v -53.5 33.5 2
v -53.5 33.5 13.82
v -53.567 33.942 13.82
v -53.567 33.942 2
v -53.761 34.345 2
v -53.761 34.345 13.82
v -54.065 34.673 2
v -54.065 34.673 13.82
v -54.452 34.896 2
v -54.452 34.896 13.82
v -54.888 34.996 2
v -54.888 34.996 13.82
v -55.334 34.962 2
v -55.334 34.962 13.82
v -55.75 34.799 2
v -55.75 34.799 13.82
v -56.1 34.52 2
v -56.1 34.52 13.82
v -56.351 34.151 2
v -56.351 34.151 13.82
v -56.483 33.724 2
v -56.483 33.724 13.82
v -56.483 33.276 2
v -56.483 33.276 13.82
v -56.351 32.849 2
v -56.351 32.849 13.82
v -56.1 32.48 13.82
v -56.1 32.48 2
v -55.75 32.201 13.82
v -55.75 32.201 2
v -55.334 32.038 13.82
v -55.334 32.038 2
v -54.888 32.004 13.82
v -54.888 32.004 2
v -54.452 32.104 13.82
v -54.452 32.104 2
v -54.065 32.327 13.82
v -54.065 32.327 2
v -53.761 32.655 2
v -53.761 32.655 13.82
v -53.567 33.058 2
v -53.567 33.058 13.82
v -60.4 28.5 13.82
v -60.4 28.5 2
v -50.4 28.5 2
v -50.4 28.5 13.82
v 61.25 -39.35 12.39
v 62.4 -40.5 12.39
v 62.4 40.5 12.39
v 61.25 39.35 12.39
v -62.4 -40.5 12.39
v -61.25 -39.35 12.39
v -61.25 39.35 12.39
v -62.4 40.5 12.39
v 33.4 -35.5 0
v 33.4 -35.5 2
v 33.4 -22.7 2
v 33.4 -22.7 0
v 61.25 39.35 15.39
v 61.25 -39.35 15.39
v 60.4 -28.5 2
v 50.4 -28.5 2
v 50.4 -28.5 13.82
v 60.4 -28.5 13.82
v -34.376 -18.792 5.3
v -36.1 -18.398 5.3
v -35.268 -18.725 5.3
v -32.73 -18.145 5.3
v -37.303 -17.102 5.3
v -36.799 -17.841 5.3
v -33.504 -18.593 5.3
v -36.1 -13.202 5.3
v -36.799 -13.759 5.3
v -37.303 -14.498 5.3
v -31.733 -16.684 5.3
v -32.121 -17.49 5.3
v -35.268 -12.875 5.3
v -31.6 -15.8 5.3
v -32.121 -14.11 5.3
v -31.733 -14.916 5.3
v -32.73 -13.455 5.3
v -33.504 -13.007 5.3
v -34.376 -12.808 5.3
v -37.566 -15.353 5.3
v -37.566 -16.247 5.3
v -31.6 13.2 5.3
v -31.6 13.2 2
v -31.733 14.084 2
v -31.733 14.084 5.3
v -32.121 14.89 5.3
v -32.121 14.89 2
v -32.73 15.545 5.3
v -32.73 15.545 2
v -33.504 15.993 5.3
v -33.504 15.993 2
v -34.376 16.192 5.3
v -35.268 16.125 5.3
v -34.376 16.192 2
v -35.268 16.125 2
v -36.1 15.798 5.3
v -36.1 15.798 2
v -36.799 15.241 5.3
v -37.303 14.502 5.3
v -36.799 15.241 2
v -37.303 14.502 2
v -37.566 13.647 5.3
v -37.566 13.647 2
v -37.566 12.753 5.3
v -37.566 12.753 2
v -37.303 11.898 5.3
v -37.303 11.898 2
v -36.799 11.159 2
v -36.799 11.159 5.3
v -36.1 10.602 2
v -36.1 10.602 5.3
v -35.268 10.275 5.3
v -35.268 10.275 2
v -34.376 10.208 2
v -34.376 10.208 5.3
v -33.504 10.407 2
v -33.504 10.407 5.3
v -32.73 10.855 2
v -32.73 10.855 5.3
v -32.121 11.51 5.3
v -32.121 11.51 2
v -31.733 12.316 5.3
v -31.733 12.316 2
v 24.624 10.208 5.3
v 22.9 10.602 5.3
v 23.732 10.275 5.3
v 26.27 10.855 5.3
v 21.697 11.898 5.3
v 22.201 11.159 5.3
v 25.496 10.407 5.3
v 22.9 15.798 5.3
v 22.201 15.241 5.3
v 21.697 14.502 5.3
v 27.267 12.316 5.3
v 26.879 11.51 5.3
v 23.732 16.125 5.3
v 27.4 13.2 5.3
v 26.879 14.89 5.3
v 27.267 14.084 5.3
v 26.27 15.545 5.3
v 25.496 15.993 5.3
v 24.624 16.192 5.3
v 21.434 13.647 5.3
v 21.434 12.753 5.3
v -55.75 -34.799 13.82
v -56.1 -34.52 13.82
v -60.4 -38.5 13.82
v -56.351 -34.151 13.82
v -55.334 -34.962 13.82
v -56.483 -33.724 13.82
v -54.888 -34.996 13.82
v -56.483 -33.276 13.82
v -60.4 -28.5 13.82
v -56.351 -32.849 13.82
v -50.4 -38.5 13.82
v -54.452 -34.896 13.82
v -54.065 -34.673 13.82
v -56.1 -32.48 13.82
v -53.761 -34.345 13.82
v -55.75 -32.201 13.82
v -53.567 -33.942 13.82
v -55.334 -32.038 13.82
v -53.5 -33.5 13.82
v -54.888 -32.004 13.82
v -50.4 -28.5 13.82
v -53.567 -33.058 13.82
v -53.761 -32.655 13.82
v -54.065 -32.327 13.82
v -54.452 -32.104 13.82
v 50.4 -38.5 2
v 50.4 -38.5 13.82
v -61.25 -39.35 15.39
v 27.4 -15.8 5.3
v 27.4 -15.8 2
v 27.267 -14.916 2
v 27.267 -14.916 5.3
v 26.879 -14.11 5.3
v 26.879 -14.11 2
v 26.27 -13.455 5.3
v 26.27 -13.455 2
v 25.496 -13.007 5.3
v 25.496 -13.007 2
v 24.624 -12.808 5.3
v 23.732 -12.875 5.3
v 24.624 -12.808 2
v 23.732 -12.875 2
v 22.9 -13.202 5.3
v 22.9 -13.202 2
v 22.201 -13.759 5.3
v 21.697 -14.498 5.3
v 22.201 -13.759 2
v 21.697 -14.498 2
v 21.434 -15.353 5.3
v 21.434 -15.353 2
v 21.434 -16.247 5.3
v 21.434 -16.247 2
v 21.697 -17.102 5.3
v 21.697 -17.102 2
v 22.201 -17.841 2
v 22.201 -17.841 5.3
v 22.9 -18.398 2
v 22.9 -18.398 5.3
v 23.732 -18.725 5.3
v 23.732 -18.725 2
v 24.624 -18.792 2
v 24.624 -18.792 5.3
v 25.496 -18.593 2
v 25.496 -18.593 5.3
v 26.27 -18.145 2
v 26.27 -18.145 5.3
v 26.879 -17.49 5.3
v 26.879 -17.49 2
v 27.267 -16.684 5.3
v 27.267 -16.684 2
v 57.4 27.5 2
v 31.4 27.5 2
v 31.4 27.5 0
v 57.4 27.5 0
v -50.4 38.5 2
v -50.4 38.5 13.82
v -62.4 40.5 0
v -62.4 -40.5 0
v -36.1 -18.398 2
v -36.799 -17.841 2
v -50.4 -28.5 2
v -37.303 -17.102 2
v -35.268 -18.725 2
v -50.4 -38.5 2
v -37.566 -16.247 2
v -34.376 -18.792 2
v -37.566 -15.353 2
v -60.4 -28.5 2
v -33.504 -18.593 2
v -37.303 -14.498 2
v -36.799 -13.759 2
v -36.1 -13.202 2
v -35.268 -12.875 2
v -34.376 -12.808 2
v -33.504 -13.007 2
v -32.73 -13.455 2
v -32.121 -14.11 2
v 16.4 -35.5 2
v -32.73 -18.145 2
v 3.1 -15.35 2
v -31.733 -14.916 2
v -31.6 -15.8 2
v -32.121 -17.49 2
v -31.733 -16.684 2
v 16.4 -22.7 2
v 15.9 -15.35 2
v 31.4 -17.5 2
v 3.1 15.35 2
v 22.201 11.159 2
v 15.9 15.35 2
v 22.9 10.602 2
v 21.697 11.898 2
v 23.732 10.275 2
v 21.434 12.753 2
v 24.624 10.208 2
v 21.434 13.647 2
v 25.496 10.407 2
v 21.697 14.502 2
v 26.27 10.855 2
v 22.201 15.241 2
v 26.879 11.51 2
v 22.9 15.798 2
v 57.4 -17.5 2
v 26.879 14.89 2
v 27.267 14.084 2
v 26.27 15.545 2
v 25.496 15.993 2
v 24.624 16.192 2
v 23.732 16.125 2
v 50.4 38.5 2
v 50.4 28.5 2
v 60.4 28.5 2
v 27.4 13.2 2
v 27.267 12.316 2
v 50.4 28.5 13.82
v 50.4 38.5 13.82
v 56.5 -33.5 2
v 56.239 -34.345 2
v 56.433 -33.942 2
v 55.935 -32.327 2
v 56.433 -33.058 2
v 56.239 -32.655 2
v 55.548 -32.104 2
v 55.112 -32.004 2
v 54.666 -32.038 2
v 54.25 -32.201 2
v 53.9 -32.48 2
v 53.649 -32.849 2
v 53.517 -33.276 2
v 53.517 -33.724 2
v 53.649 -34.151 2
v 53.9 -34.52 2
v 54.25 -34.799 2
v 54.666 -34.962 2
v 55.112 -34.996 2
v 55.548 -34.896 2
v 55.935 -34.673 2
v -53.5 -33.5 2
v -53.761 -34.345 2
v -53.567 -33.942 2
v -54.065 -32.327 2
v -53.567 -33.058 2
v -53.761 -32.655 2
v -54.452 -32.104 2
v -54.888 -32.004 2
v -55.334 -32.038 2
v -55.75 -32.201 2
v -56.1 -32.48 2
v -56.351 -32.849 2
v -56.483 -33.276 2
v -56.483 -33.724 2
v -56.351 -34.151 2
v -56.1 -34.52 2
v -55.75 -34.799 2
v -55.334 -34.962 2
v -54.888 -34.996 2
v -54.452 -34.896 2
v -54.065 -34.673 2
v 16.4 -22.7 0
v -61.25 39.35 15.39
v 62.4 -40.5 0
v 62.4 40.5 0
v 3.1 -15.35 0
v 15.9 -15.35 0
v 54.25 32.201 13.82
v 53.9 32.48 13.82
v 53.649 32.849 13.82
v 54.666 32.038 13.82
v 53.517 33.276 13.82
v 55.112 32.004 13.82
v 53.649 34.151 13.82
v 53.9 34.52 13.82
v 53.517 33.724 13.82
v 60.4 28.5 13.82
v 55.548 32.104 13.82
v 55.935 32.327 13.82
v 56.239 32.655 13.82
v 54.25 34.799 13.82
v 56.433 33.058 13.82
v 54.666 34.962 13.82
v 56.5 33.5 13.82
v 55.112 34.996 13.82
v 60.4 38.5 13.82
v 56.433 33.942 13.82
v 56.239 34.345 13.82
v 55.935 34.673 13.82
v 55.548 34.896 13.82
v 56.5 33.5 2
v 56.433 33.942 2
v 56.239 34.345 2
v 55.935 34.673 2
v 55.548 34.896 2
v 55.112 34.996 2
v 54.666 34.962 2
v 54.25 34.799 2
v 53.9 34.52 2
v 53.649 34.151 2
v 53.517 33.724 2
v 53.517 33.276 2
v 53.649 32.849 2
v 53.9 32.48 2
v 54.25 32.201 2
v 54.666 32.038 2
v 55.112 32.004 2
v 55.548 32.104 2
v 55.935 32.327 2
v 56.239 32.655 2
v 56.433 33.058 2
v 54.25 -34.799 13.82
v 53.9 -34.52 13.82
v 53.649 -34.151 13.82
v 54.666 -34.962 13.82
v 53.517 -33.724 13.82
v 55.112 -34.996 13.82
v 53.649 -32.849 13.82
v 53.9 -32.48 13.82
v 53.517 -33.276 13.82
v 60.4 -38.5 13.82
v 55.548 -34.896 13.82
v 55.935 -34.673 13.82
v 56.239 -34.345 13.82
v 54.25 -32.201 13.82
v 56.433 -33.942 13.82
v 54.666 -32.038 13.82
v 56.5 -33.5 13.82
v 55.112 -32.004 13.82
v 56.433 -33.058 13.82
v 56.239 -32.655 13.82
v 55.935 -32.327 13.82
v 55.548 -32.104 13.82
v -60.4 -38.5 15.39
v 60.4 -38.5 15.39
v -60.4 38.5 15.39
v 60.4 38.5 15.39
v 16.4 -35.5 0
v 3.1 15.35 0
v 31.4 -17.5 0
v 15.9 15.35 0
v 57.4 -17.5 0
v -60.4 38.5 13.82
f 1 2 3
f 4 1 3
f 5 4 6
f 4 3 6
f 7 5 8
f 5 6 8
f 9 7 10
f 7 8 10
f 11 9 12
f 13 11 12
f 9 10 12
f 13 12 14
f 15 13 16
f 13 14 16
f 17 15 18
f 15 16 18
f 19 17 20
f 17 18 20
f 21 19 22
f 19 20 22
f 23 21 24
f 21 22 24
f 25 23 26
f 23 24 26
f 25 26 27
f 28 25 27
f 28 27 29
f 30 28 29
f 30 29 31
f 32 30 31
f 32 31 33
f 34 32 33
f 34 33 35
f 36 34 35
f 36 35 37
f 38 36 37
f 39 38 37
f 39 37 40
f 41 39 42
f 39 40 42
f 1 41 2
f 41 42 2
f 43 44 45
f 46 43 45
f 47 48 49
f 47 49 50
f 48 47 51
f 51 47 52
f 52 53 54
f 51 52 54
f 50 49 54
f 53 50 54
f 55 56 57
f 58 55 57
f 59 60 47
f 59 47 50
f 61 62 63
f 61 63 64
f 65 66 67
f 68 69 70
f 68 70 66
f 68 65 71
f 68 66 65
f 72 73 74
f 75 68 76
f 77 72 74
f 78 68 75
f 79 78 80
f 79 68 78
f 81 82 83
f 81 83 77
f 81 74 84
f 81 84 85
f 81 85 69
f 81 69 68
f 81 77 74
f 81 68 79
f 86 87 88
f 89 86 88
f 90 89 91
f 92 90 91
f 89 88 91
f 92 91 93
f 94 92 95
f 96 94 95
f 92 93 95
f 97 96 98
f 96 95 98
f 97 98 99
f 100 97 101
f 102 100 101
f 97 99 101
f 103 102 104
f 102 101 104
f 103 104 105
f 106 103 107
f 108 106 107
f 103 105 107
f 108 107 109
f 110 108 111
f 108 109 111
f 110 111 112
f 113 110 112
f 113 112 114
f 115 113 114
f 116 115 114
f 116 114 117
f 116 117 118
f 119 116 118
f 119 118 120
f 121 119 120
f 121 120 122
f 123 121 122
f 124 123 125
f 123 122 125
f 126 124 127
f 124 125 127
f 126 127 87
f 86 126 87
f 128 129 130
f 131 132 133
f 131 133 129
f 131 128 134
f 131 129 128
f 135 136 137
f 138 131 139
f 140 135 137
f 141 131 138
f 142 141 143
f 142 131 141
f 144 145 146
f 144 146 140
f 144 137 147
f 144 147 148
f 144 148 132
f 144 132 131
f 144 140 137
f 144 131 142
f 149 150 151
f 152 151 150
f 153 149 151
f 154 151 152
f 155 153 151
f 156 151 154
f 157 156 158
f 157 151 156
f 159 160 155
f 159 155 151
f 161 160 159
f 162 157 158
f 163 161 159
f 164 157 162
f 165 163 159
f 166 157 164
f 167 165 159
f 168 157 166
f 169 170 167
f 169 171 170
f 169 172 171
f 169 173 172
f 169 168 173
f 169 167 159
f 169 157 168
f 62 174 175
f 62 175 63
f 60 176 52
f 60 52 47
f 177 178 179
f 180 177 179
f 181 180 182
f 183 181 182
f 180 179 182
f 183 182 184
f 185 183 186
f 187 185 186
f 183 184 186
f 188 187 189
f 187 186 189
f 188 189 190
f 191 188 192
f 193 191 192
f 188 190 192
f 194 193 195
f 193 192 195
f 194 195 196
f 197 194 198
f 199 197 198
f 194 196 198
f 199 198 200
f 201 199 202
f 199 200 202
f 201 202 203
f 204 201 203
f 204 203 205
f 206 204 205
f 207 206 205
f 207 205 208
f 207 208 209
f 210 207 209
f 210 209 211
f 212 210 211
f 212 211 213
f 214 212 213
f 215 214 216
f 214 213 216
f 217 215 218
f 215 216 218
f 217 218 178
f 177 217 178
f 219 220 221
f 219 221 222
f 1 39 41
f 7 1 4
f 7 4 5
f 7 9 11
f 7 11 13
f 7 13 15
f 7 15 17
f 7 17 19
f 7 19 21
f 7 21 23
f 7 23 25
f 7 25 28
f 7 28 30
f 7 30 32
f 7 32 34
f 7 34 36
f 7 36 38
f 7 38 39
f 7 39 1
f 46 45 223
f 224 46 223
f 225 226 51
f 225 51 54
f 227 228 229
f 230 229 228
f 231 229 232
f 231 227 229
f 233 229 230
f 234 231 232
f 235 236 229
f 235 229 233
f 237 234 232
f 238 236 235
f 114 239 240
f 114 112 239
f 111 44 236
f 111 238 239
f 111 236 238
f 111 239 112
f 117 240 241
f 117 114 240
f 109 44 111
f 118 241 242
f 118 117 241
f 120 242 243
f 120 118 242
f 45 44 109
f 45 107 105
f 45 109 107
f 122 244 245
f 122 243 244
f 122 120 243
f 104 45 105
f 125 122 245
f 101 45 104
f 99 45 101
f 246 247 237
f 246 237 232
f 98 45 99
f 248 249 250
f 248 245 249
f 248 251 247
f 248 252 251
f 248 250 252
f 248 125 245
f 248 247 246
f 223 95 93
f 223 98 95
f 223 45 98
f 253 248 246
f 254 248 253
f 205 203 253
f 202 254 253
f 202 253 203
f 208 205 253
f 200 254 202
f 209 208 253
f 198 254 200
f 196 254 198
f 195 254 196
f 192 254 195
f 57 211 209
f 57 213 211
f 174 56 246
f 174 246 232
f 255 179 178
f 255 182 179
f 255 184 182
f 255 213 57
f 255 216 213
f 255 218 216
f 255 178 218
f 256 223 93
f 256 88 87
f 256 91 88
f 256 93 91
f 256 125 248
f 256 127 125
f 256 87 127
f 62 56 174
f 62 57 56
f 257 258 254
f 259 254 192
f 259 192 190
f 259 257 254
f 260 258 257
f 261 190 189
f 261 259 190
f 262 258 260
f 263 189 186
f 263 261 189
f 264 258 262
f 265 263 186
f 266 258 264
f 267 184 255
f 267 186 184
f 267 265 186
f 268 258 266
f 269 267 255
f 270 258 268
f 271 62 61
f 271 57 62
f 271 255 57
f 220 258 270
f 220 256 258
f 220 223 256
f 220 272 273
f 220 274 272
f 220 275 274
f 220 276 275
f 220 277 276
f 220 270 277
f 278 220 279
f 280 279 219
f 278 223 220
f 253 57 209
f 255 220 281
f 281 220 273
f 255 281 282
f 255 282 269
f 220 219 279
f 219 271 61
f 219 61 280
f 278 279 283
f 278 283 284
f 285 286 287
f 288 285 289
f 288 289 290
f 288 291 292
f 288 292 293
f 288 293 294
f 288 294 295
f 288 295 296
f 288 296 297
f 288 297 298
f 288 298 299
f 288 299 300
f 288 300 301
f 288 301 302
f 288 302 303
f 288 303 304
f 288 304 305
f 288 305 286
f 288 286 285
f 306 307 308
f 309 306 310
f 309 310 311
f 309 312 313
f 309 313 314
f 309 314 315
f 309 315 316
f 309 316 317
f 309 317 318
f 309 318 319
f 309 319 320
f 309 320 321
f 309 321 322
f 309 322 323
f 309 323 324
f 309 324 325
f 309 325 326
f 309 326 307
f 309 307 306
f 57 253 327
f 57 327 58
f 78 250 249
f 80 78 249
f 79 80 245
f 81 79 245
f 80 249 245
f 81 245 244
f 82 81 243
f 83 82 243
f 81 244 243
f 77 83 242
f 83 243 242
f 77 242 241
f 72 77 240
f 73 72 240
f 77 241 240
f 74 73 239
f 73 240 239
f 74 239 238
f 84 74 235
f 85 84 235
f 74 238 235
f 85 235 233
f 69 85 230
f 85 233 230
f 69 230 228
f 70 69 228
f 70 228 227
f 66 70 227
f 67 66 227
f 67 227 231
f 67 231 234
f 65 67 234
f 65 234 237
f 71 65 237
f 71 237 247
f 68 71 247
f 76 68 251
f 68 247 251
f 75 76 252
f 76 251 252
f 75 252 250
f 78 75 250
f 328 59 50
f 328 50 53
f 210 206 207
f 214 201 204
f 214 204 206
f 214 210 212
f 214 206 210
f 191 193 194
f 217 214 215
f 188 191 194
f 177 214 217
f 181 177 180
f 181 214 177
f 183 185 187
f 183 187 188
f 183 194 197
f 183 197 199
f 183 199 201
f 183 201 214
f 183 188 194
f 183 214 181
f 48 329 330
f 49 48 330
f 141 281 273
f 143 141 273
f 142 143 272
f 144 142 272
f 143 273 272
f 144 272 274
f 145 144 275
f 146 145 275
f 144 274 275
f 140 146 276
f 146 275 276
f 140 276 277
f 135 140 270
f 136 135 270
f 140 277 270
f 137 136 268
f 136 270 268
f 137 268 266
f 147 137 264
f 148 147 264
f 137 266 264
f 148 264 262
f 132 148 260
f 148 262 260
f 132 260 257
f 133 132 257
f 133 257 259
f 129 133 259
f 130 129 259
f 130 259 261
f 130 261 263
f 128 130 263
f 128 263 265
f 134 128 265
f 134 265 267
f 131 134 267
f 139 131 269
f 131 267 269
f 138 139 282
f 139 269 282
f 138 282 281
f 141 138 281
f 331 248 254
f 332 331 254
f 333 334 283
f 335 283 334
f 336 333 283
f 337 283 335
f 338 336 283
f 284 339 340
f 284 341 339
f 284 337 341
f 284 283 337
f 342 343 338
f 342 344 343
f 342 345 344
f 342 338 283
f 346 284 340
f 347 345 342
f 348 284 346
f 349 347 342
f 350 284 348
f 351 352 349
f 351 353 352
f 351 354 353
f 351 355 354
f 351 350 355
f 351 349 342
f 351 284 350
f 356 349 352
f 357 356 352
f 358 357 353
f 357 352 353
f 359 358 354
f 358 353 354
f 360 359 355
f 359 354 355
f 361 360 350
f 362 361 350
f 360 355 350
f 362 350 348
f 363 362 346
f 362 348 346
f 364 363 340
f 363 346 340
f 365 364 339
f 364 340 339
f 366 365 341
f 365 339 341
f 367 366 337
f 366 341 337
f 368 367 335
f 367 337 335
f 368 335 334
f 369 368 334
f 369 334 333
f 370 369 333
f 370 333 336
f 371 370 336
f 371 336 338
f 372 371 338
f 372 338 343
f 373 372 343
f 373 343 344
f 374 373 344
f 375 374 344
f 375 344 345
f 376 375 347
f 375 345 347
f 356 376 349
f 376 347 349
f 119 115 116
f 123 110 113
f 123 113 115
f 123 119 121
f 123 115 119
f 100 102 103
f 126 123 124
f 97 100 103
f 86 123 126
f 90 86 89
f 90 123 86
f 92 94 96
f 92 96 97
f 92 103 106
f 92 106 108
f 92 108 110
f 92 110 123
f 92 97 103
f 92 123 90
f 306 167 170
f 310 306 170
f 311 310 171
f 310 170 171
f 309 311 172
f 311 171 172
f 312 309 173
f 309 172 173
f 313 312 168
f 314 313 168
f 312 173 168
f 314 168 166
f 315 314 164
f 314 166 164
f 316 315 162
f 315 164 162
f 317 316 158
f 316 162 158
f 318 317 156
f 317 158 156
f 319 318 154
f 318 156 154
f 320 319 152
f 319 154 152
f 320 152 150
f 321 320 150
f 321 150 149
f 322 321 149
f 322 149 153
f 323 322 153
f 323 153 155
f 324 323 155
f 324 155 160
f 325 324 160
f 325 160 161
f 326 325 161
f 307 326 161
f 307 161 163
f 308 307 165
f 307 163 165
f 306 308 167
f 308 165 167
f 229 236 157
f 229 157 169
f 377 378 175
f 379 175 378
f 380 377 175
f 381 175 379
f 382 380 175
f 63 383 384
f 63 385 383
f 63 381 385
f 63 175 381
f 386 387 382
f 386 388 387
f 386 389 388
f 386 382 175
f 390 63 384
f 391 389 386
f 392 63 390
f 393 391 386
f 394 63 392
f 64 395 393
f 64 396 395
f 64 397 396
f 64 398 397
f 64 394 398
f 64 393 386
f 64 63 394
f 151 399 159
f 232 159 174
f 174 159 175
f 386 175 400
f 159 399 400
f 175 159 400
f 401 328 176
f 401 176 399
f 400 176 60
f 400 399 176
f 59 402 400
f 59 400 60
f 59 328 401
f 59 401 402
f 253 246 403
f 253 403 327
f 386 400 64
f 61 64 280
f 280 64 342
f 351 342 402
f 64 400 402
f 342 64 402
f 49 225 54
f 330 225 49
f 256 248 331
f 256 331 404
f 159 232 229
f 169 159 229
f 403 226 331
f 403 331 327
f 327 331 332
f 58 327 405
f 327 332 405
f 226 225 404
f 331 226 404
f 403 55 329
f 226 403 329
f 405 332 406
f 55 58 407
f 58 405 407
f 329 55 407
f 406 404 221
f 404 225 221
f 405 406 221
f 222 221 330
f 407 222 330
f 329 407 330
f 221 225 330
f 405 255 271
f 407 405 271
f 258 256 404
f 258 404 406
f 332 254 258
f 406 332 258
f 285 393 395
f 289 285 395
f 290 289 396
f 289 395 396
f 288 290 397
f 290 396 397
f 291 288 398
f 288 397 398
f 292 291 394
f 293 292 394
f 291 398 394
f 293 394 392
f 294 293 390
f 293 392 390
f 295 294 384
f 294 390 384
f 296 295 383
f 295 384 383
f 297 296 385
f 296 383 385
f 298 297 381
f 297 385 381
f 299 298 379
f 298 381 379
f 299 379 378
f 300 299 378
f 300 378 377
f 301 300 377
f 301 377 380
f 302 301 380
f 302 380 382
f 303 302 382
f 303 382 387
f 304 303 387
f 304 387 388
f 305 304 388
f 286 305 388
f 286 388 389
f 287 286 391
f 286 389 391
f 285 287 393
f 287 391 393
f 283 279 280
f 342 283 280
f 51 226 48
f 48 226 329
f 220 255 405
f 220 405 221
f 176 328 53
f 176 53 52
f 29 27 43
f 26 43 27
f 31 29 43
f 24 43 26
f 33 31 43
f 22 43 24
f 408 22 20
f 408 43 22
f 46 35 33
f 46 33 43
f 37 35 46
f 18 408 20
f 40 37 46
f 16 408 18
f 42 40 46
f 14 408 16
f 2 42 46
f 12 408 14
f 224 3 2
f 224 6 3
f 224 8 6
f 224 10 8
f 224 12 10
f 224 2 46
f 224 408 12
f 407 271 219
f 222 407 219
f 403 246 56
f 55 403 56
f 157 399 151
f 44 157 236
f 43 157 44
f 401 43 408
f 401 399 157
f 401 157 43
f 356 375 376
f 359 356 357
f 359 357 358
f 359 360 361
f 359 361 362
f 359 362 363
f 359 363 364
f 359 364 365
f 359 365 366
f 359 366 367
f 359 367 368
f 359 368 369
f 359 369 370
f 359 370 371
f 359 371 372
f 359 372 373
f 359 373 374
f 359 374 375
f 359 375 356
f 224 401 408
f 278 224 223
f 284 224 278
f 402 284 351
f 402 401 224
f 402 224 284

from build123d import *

# Parameters (mm, degrees)
F0_W      = 124.8
F0_H      = 81
F1_DEPTH  = 15.39
F2_W      = 120.8
F2_H      = 77
F3_DEPTH  = 13.39
F4_W      = 124.8
F4_H      = 3
F5_DEPTH  = 1.15
F6_W      = 124.8
F6_H      = 3
F7_DEPTH  = 1.15
F8_W      = 78.7
F8_H      = 3
F9_DEPTH  = 1.15
F10_W     = 78.7
F10_H     = 3
F11_DEPTH = 1.15
F12_W     = 10
F12_H     = 10
F13_DEPTH = 11.82
F14_W     = 10
F14_H     = 10
F15_DEPTH = 11.82
F16_W     = 10
F16_H     = 10
F17_DEPTH = 11.82
F18_W     = 10
F18_H     = 10
F19_DEPTH = 11.82
F20_R     = 1.5
F21_DEPTH = 11.82
F22_R     = 1.5
F23_DEPTH = 11.82
F24_R     = 1.5
F25_DEPTH = 11.82
F26_R     = 1.5
F27_DEPTH = 11.82
F28_W     = 26
F28_H     = 45
F29_DEPTH = 2.001
F30_W     = 12.8
F30_H     = 30.7
F31_DEPTH = 2.001
F32_W     = 17
F32_H     = 12.8
F33_DEPTH = 2.001
F34_R     = 3
F35_DEPTH = 3.3


with BuildPart() as f1:
    # F0 (on Top) → F1 (new body)
    with BuildSketch(Plane.XY):
        Rectangle(F0_W, F0_H)
    extrude(amount=F1_DEPTH)

    # F2 (on face) → F3 (cut)
    with BuildSketch(Plane.XY.offset(15.39)):
        Rectangle(F2_W, F2_H)
    extrude(amount=-F3_DEPTH, mode=Mode.SUBTRACT)

    # F4 (on face) → F5 (cut)
    with BuildSketch(Plane(origin=(0, 40.5, 0), x_dir=(-1, 0, 0), z_dir=(0, 1, 0))):
        with Locations((0, 13.89)):
            Rectangle(F4_W, F4_H)
    extrude(amount=-F5_DEPTH, mode=Mode.SUBTRACT)

    # F6 (on face) → F7 (cut)
    with BuildSketch(Plane.XZ.offset(40.5)):
        with Locations((0, 13.89)):
            Rectangle(F6_W, F6_H)
    extrude(amount=-F7_DEPTH, mode=Mode.SUBTRACT)

    # F8 (on face) → F9 (cut)
    with BuildSketch(Plane(origin=(-62.4, 0, 0), x_dir=(0, -1, 0), z_dir=(-1, 0, 0))):
        with Locations((0, 13.89)):
            Rectangle(F8_W, F8_H)
    extrude(amount=-F9_DEPTH, mode=Mode.SUBTRACT)

    # F10 (on face) → F11 (cut)
    with BuildSketch(Plane.YZ.offset(62.4)):
        with Locations((0, 13.89)):
            Rectangle(F10_W, F10_H)
    extrude(amount=-F11_DEPTH, mode=Mode.SUBTRACT)

    # F12 (on face) → F13 (join)
    with BuildSketch(Plane.XY.offset(2)):
        with Locations((-55.4, 33.5)):
            Rectangle(F12_W, F12_H)
    extrude(amount=F13_DEPTH)

    # F14 (on face) → F15 (join)
    with BuildSketch(Plane.XY.offset(2)):
        with Locations((-55.4, -33.5)):
            Rectangle(F14_W, F14_H)
    extrude(amount=F15_DEPTH)

    # F16 (on face) → F17 (join)
    with BuildSketch(Plane.XY.offset(2)):
        with Locations((55.4, -33.5)):
            Rectangle(F16_W, F16_H)
    extrude(amount=F17_DEPTH)

    # F18 (on face) → F19 (join)
    with BuildSketch(Plane.XY.offset(2)):
        with Locations((55.4, 33.5)):
            Rectangle(F18_W, F18_H)
    extrude(amount=F19_DEPTH)

    # F20 (on face) → F21 (cut)
    with BuildSketch(Plane.XY.offset(13.82)):
        with Locations((-55, 33.5)):
            Circle(F20_R)
    extrude(amount=-F21_DEPTH, mode=Mode.SUBTRACT)

    # F22 (on face) → F23 (cut)
    with BuildSketch(Plane.XY.offset(13.82)):
        with Locations((-55, -33.5)):
            Circle(F22_R)
    extrude(amount=-F23_DEPTH, mode=Mode.SUBTRACT)

    # F24 (on face) → F25 (cut)
    with BuildSketch(Plane.XY.offset(13.82)):
        with Locations((55, -33.5)):
            Circle(F24_R)
    extrude(amount=-F25_DEPTH, mode=Mode.SUBTRACT)

    # F26 (on face) → F27 (cut)
    with BuildSketch(Plane.XY.offset(13.82)):
        with Locations((55, 33.5)):
            Circle(F26_R)
    extrude(amount=-F27_DEPTH, mode=Mode.SUBTRACT)

    # F28 (on face) → F29 (cut, through all)
    with BuildSketch(Plane.XY.offset(2)):
        with Locations((44.4, 5)):
            Rectangle(F28_W, F28_H)
    extrude(amount=-F29_DEPTH, mode=Mode.SUBTRACT)

    # F30 (on face) → F31 (cut, through all)
    with BuildSketch(Plane.XY.offset(2)):
        with Locations((9.5, 0)):
            Rectangle(F30_W, F30_H)
    extrude(amount=-F31_DEPTH, mode=Mode.SUBTRACT)

    # F32 (on face) → F33 (cut, through all)
    with BuildSketch(Plane.XY.offset(2)):
        with Locations((24.9, -29.1)):
            Rectangle(F32_W, F32_H)
    extrude(amount=-F33_DEPTH, mode=Mode.SUBTRACT)

    # F34 (on face) → F35 (join)
    with BuildSketch(Plane.XY.offset(2)):
        with Locations((24.4, 13.2)):
            Circle(F34_R)
        with Locations((24.4, -15.8)):
            Circle(F34_R)
        with Locations((-34.6, 13.2)):
            Circle(F34_R)
        with Locations((-34.6, -15.8)):
            Circle(F34_R)
    extrude(amount=F35_DEPTH)


solid = f1.part
